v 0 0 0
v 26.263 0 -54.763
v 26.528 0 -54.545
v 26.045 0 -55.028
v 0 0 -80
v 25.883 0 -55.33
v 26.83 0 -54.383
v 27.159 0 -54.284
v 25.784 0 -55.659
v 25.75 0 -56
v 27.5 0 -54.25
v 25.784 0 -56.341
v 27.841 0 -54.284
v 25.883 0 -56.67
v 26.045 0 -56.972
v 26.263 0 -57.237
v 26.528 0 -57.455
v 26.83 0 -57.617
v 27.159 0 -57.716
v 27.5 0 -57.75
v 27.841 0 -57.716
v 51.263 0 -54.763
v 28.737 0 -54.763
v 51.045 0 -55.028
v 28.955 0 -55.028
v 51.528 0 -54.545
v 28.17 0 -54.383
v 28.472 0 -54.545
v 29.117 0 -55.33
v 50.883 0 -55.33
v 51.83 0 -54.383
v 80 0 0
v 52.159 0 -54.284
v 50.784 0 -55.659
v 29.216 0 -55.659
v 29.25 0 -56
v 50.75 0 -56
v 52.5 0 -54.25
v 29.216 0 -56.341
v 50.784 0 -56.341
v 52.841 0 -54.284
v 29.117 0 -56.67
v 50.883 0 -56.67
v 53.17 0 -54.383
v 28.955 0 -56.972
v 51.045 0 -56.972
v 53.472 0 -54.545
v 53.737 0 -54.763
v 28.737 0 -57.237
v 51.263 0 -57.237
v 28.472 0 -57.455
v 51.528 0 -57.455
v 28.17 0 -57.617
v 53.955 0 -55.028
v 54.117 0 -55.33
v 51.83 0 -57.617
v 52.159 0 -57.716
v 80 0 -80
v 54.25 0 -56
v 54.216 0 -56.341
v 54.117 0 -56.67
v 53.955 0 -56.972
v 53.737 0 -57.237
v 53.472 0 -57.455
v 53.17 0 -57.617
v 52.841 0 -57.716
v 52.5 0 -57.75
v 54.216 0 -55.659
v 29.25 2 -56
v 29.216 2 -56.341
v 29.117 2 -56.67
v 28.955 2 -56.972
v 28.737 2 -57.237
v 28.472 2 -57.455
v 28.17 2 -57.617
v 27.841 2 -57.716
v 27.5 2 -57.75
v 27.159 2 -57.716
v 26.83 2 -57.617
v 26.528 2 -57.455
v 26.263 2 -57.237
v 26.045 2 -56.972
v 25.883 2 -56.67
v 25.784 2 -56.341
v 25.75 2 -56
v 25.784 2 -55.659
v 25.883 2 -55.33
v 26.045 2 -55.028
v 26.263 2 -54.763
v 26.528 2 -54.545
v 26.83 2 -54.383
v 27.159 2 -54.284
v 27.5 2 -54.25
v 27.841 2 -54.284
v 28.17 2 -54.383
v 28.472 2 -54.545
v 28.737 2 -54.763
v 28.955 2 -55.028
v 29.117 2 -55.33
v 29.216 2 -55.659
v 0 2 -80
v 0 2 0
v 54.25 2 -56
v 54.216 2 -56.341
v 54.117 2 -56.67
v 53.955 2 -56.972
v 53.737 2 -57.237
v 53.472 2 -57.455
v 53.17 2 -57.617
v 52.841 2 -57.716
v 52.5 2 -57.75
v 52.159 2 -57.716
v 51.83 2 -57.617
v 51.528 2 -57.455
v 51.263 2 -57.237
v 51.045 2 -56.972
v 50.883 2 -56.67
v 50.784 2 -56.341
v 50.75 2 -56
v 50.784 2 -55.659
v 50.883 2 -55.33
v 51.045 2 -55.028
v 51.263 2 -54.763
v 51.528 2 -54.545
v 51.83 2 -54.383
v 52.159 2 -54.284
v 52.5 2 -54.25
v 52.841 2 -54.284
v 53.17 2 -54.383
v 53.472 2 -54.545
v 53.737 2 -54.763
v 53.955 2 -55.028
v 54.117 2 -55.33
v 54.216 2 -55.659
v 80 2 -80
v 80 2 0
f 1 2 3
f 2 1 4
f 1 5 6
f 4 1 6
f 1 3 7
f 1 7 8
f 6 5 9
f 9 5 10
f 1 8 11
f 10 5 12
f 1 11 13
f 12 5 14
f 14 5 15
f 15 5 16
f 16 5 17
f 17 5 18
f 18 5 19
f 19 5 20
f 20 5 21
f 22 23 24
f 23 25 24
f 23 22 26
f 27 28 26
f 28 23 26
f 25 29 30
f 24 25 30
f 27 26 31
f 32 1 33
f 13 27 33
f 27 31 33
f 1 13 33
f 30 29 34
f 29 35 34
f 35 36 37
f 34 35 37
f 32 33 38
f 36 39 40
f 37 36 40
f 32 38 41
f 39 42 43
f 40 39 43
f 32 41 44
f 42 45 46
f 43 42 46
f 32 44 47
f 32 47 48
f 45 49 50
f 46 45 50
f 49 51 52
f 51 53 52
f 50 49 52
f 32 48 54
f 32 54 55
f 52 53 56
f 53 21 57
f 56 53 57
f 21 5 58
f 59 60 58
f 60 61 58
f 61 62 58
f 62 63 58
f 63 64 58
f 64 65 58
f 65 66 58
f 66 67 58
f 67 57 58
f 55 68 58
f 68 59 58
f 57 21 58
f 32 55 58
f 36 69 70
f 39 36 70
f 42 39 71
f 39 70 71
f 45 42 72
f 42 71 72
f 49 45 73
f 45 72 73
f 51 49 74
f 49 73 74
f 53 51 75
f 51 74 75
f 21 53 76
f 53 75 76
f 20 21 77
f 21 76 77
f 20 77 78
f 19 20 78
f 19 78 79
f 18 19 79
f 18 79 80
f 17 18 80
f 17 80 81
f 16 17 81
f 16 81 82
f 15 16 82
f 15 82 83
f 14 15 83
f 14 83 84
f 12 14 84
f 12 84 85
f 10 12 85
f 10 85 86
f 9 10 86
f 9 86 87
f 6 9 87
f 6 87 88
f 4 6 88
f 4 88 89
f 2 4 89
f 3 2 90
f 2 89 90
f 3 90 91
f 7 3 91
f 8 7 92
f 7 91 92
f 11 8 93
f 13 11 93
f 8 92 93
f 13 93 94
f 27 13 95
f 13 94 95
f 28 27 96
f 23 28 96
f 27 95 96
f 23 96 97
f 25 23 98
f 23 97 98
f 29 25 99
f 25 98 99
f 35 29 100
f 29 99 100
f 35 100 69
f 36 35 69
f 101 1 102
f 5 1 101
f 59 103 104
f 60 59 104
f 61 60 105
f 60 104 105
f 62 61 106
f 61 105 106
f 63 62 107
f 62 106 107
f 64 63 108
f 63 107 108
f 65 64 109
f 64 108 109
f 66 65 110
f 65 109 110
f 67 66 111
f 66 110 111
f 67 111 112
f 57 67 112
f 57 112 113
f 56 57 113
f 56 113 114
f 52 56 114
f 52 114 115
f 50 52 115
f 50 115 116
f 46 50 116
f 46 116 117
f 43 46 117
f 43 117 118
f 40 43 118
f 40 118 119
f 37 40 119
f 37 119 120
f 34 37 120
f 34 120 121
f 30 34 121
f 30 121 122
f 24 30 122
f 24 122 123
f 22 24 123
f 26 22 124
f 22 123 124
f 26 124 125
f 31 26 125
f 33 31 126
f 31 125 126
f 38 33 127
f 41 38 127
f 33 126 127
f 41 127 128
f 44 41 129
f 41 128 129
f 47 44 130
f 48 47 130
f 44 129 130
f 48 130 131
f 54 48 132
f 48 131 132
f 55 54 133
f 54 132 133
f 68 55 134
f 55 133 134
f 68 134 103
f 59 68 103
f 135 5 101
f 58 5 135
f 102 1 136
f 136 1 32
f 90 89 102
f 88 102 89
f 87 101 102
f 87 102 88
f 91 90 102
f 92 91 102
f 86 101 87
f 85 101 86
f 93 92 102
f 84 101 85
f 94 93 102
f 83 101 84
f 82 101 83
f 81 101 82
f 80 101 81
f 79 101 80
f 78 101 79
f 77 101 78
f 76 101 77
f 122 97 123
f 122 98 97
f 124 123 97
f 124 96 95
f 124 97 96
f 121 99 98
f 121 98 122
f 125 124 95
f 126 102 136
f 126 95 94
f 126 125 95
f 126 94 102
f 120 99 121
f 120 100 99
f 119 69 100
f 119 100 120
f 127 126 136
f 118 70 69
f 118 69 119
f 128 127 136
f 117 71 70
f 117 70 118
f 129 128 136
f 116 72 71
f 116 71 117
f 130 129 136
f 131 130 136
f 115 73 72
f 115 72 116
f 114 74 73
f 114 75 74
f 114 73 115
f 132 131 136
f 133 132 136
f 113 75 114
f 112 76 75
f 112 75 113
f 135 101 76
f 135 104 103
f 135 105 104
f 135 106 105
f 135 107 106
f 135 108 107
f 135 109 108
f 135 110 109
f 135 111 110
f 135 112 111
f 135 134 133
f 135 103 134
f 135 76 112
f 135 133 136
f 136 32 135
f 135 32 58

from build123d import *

# Parameters (mm, degrees)
ESQUISSE1_W             = 80
ESQUISSE1_H             = 80
BOSS_EXTRU_1_DEPTH      = 2
ENL_V_MAT_EXTRU_1_REACH = 4
ESQUISSE2_R             = 1.75


with BuildPart() as part:
    # Esquisse1 → Boss.-Extru.1 (new body)
    with BuildSketch(Plane(origin=(0, 0, 0), x_dir=(1, 0, 0), z_dir=(0, 1, 0))):
        with Locations((40, 40)):
            Rectangle(ESQUISSE1_W, ESQUISSE1_H)
    extrude(amount=BOSS_EXTRU_1_DEPTH)

    # Esquisse2 → Enlèv. mat.-Extru.1 (cut, up to next)
    with BuildSketch(Plane(origin=(0, 2, 0), x_dir=(1, 0, 0), z_dir=(0, 1, 0)), mode=Mode.PRIVATE) as enl_v_mat_extru_1_sk1:
        with Locations((27.5, 56)):
            Circle(ESQUISSE2_R)
    enl_v_mat_extru_1_tool1 = extrude(enl_v_mat_extru_1_sk1.sketch, amount=-ENL_V_MAT_EXTRU_1_REACH, mode=Mode.PRIVATE) & part.part
    add(enl_v_mat_extru_1_tool1.solids().sort_by_distance((27.5, 2, -56))[0], mode=Mode.SUBTRACT)
    # Esquisse2 → Enlèv. mat.-Extru.1 (cut, up to next)
    with BuildSketch(Plane(origin=(0, 2, 0), x_dir=(1, 0, 0), z_dir=(0, 1, 0)), mode=Mode.PRIVATE) as enl_v_mat_extru_1_sk2:
        with Locations((52.5, 56)):
            Circle(ESQUISSE2_R)
    enl_v_mat_extru_1_tool2 = extrude(enl_v_mat_extru_1_sk2.sketch, amount=-ENL_V_MAT_EXTRU_1_REACH, mode=Mode.PRIVATE) & part.part
    add(enl_v_mat_extru_1_tool2.solids().sort_by_distance((52.5, 2, -56))[0], mode=Mode.SUBTRACT)


solid = part.part
